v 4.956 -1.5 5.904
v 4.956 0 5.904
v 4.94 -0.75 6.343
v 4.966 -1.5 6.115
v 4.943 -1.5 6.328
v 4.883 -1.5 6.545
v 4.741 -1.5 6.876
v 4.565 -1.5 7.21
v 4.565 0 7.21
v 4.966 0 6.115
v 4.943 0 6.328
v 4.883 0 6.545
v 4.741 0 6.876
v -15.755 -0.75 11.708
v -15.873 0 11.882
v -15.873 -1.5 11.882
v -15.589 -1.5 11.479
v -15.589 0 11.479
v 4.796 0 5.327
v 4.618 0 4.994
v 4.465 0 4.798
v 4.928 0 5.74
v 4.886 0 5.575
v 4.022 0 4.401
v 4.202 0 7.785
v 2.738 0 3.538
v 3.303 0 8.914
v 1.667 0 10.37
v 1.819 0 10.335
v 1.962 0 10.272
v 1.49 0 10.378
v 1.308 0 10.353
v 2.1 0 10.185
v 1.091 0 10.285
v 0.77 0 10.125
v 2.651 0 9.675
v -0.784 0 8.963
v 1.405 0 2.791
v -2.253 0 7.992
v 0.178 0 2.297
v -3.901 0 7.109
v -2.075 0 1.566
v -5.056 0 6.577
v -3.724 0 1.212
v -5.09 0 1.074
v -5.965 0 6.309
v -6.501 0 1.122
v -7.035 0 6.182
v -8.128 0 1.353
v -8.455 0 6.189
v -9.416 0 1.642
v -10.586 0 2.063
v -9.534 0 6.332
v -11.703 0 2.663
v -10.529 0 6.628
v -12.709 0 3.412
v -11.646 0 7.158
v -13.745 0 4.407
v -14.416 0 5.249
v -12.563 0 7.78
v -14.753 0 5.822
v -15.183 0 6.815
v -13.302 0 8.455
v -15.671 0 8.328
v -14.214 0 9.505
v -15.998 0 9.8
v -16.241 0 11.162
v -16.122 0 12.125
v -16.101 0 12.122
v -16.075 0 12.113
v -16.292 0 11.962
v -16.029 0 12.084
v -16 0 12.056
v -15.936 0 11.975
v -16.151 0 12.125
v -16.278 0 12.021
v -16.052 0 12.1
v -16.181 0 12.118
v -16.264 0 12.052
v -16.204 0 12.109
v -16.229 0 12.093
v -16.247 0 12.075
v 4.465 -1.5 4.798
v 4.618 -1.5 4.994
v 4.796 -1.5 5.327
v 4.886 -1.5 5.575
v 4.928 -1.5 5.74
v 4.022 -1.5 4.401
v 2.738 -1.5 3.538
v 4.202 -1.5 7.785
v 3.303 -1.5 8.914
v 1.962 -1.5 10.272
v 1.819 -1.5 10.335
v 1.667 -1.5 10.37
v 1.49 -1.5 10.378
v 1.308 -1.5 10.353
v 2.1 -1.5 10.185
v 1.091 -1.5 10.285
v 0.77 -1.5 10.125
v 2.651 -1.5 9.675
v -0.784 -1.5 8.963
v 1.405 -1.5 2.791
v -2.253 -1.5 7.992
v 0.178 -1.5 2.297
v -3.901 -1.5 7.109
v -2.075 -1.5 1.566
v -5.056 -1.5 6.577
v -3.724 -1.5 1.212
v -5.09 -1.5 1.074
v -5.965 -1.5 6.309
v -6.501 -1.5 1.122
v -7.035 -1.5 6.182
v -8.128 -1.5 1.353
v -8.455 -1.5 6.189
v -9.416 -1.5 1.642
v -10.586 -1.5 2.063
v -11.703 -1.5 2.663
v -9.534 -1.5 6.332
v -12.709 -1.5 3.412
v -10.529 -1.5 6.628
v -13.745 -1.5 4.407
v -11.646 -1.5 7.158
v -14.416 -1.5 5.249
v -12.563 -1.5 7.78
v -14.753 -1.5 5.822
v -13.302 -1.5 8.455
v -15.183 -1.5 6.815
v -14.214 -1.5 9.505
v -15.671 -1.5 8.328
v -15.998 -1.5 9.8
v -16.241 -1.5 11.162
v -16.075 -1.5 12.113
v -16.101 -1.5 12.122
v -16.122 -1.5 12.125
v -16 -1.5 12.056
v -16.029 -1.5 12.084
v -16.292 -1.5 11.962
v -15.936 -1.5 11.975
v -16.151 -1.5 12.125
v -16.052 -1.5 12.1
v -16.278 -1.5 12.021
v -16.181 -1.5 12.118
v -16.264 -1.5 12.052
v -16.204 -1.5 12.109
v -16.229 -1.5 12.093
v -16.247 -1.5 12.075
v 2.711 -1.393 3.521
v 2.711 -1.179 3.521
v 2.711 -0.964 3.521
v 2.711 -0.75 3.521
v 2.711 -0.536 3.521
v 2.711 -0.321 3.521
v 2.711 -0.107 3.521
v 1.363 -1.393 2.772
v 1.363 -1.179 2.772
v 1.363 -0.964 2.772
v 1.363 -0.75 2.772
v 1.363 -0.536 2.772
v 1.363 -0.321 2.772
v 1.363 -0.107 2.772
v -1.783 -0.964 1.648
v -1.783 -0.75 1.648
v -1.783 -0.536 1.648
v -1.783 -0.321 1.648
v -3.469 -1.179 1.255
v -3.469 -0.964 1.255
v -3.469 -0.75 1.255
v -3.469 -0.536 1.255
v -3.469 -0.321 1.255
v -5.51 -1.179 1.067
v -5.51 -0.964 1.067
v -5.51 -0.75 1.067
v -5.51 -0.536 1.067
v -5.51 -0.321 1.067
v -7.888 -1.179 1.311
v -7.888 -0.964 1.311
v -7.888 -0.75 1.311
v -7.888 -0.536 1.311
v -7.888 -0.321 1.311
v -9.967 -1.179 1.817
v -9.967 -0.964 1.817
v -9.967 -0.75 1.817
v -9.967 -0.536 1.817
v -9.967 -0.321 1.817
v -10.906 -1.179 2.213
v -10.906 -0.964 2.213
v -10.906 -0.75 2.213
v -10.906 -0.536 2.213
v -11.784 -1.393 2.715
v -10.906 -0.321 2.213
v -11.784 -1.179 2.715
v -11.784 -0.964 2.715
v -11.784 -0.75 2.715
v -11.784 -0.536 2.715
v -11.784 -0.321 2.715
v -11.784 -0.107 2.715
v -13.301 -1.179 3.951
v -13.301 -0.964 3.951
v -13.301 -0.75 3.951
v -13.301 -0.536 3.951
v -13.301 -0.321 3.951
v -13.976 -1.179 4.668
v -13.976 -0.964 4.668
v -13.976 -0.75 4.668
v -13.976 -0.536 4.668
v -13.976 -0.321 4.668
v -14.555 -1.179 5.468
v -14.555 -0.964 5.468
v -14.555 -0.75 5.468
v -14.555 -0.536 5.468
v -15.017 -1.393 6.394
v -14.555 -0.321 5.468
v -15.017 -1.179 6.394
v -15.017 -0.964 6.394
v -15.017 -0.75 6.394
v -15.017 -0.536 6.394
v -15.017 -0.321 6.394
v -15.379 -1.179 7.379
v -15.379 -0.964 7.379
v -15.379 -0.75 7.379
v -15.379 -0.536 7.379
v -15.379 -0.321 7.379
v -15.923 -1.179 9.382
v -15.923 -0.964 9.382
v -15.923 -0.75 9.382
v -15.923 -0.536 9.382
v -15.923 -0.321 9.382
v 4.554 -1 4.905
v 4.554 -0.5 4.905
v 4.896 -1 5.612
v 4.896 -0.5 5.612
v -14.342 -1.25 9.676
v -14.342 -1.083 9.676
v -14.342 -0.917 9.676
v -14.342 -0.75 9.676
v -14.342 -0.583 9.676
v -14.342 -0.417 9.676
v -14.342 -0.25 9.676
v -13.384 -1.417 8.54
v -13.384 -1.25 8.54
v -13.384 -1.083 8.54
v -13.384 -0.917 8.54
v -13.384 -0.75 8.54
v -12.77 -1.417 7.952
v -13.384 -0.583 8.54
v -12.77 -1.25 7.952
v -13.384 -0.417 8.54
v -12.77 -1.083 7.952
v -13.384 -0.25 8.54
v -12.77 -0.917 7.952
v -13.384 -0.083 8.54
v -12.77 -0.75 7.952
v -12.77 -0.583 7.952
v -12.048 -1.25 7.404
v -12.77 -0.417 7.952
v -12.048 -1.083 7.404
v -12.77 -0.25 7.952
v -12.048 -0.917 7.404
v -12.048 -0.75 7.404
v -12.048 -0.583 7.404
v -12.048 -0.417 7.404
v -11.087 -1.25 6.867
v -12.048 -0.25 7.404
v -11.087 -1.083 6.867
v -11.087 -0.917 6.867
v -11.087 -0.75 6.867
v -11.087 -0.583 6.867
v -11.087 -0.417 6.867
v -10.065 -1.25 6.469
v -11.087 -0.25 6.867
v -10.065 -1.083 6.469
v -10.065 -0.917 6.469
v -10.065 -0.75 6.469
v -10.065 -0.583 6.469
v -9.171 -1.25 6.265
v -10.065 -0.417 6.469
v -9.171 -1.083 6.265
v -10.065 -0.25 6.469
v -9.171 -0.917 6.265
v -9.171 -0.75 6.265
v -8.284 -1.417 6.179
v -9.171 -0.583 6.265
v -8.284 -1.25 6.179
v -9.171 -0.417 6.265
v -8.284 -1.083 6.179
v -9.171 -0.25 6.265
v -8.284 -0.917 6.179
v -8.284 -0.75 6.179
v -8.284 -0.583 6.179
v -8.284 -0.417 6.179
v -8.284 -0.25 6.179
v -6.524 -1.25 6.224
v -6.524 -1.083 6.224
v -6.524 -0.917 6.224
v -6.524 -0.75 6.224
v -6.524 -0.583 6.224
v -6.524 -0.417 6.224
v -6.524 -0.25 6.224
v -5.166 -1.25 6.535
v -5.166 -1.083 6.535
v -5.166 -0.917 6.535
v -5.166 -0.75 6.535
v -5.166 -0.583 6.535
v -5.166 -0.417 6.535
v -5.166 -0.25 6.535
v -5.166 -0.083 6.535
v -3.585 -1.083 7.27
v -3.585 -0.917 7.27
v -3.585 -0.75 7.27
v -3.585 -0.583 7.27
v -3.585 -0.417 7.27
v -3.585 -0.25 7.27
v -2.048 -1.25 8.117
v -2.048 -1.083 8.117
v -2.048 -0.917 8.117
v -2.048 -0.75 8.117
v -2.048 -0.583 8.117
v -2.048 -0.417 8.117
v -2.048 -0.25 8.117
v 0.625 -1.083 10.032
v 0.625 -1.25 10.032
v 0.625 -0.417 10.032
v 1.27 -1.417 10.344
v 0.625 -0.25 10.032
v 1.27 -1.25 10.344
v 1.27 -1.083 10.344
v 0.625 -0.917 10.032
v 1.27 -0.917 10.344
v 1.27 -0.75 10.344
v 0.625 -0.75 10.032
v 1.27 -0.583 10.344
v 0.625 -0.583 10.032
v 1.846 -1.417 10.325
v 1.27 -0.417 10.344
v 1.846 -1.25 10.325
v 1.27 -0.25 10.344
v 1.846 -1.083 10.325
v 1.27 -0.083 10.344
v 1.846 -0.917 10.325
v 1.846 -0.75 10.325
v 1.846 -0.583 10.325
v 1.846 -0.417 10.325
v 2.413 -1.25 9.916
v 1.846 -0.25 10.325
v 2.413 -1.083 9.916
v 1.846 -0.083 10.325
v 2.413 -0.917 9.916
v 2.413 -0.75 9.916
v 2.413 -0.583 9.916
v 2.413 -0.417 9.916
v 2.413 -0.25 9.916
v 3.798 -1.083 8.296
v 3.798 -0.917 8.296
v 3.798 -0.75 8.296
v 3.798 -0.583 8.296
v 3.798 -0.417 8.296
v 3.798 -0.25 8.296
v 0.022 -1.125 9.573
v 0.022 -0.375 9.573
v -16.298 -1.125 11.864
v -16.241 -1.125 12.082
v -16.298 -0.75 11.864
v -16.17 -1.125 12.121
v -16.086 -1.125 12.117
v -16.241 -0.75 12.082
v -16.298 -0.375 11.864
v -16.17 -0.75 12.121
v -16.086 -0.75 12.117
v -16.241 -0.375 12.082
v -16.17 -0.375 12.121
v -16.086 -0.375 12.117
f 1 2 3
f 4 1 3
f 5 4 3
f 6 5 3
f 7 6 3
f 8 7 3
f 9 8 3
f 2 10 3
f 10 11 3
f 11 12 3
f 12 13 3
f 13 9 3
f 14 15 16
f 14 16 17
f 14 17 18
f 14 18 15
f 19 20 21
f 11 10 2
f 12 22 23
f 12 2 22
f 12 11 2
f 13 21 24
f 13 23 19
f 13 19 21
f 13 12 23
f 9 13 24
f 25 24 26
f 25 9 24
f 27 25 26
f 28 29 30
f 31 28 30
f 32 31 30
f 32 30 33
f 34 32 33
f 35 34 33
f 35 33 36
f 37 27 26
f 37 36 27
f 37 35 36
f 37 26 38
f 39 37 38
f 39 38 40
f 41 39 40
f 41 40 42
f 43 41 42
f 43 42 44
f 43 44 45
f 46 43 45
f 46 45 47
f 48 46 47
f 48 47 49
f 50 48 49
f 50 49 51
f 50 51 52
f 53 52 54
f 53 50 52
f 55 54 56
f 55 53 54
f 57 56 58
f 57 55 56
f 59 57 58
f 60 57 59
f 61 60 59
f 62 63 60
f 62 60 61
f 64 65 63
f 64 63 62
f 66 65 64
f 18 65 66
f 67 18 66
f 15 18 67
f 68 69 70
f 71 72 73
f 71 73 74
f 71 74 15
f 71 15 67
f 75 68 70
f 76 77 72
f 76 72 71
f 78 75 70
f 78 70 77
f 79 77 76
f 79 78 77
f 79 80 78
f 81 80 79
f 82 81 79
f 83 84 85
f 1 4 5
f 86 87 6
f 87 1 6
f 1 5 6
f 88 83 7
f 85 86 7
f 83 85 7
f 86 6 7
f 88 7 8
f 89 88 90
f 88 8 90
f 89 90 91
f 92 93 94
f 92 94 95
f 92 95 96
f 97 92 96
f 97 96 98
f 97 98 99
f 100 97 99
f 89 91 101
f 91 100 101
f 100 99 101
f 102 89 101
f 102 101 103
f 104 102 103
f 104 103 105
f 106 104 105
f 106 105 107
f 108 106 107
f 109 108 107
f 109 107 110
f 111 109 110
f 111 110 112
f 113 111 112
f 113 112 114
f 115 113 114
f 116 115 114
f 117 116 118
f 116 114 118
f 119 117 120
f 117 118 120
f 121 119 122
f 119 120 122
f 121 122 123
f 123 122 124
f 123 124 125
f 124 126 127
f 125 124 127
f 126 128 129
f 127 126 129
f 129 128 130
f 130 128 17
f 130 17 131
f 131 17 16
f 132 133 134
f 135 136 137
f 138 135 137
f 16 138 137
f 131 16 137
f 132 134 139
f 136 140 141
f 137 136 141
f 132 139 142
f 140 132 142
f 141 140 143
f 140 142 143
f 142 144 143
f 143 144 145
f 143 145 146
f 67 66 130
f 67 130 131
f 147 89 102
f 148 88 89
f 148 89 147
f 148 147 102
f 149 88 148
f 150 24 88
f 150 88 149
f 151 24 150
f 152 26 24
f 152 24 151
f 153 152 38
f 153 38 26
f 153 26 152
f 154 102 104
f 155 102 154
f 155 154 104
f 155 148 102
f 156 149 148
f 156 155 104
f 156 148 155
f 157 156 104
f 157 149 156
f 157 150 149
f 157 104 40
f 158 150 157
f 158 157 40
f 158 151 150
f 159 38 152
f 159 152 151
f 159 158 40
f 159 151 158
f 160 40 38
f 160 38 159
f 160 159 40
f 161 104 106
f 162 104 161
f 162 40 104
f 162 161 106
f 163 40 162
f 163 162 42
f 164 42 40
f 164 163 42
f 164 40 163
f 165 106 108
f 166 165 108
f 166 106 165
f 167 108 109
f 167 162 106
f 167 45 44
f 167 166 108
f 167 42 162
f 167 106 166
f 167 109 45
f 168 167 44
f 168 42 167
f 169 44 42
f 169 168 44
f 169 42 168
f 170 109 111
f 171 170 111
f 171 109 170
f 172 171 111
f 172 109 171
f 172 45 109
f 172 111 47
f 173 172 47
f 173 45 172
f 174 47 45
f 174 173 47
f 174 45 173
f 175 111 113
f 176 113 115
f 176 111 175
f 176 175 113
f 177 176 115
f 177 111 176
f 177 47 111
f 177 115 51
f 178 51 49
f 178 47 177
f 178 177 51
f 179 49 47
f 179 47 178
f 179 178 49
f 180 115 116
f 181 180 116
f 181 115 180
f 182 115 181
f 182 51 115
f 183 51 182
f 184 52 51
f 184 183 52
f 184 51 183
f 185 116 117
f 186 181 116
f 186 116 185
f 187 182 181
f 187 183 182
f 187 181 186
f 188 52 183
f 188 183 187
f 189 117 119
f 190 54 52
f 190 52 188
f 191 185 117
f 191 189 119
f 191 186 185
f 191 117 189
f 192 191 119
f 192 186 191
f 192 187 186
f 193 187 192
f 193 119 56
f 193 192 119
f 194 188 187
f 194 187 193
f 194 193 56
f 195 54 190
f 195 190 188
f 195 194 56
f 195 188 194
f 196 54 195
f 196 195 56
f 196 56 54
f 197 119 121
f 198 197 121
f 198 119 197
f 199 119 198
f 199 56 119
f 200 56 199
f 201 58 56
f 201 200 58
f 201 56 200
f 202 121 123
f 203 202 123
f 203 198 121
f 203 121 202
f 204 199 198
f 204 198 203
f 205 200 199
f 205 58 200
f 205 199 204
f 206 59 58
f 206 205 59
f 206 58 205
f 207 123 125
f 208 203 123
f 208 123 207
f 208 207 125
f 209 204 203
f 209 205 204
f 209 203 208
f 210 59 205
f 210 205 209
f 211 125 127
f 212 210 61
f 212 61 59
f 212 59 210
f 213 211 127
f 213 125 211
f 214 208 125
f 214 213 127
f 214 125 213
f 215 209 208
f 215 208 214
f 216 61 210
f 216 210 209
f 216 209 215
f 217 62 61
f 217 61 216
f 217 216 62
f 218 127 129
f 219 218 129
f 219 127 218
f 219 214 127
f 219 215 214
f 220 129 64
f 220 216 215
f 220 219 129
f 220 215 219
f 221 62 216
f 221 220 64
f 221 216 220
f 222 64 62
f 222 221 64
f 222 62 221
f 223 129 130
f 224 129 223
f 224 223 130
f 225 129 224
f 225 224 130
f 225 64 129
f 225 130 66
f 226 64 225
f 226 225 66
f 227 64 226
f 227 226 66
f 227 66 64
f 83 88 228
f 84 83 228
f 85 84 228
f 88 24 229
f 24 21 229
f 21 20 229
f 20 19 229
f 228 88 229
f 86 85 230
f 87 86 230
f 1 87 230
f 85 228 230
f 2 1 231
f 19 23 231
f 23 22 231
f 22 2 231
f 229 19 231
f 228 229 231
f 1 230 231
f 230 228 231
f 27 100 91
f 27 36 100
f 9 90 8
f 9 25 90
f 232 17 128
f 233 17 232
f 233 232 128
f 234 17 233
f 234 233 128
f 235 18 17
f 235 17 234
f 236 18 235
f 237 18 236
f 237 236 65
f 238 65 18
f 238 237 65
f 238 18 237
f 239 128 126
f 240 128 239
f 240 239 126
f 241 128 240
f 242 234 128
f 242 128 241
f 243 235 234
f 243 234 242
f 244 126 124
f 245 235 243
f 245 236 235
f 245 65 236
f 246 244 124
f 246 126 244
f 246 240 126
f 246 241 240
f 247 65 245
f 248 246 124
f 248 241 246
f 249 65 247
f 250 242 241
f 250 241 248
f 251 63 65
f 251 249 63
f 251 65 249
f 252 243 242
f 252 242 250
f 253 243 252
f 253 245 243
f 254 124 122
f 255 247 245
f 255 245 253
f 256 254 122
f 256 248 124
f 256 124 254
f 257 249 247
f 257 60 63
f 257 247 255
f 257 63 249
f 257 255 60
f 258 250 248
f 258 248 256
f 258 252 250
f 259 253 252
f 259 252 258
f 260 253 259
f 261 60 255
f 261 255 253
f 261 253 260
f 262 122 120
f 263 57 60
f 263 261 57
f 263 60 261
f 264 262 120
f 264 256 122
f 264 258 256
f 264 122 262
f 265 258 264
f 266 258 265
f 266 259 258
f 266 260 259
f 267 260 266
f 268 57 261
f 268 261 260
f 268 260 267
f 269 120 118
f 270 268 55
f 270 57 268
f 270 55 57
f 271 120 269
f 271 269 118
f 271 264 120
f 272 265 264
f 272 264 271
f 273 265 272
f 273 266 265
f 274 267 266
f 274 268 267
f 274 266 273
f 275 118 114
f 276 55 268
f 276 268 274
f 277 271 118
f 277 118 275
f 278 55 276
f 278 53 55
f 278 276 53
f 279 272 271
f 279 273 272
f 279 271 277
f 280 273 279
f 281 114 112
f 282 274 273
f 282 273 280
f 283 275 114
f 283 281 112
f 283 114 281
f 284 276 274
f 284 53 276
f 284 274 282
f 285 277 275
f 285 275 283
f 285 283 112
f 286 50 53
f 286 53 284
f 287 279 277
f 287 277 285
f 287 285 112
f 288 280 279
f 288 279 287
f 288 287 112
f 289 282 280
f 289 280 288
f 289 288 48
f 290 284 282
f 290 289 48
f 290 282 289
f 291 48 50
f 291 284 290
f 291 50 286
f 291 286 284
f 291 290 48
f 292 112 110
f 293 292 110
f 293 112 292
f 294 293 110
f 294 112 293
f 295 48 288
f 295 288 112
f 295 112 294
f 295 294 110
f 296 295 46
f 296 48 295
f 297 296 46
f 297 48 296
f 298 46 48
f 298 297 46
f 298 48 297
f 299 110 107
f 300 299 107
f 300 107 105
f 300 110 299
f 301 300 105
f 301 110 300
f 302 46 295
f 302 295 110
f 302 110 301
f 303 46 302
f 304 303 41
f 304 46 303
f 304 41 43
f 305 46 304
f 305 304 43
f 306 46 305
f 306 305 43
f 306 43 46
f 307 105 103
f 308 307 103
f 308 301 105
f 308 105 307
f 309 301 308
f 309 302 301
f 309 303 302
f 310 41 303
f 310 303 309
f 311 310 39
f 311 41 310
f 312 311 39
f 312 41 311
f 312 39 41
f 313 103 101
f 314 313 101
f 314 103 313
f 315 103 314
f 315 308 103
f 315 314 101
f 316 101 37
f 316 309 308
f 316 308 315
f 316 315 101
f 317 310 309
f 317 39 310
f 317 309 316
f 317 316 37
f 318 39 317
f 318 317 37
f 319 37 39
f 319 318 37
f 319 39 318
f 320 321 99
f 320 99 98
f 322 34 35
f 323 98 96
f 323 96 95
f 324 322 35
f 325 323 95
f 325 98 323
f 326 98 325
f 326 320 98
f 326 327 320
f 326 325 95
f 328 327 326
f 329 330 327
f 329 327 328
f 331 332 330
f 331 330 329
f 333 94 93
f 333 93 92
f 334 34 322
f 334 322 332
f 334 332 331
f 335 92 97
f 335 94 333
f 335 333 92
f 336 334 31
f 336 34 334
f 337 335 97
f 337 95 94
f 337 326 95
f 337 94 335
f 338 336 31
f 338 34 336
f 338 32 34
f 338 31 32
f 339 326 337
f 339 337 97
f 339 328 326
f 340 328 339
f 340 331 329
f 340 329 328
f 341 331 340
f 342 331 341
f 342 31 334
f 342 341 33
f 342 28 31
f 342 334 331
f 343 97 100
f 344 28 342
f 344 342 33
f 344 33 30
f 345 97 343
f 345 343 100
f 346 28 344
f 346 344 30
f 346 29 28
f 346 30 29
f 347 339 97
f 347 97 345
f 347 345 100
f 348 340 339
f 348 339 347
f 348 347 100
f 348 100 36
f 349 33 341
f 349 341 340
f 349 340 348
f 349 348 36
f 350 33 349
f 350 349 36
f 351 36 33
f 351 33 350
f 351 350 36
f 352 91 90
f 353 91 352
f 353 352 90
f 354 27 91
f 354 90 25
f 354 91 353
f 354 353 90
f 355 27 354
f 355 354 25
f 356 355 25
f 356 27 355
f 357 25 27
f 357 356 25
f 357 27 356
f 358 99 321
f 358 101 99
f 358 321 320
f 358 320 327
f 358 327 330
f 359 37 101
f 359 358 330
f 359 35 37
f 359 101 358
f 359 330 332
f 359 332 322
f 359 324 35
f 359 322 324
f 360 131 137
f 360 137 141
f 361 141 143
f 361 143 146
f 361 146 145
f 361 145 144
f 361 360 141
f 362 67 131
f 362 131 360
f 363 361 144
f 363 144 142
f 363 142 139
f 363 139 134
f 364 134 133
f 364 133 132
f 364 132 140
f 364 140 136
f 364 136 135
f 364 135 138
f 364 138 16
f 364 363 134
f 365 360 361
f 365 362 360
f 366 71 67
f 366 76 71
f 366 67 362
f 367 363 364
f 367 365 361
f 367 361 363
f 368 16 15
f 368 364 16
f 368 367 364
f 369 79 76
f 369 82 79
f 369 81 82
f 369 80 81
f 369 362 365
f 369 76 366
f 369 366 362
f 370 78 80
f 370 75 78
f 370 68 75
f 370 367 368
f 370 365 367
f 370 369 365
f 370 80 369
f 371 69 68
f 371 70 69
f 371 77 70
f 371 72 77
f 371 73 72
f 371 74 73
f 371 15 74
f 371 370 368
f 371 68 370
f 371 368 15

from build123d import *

# Parameters (mm, degrees)
F1_DEPTH = 1.5


with BuildPart() as f1:
    # F0 (on Front) → F1 (new body)
    with BuildSketch(Plane.XZ):
        with BuildLine():
            add(Edge.make_bspline(
                [(-15.5886812717, 11.4794949823), (-15.4143296847, 11.2382539811), (-15.0361844262, 10.7150345355), (-14.3520272629, 9.6369158456), (-13.3901809462, 8.4961422482), (-12.1013087962, 7.3193862365), (-10.0843733619, 6.363980171), (-8.321372324, 6.1358495153), (-6.5126508034, 6.1753650592), (-5.1529070228, 6.4692660827), (-3.5419333867, 7.2903643377), (-2.0612605045, 8.0556770571), (-0.2510856551, 9.3241557763), (0.5687606343, 10.0334130257), (1.2462094689, 10.3912597961), (1.8789769228, 10.3955484825), (2.442581301, 9.9073187544), (3.0325423811, 9.2674548808), (3.8016255024, 8.2778595229), (4.3631617457, 7.6096235524), (4.5653669513, 7.2100887828)],
                knots=[0, 0, 0, 0, 0.0212712459, 0.0461344856, 0.0730651165, 0.1023249612, 0.1350350284, 0.1647196312, 0.1940312263, 0.2201164738, 0.2492921901, 0.2785567502, 0.3112769334, 0.3344058624, 0.3531170279, 0.369878703, 0.3883554579, 0.4090860244, 0.4338064524, 0.4592890108, 0.4592890108, 0.4592890108, 0.4592890108], degree=3))
            add(Edge.make_bspline(
                [(-15.8734871656, 11.8816214435), (-15.8360353147, 11.825599868), (-15.7551088144, 11.7045476383), (-15.6468429454, 11.5581444589), (-15.5886812717, 11.4794949823)],
                knots=[0, 0, 0, 0, 0.4627884651, 1, 1, 1, 1], degree=3))
            add(Edge.make_bspline(
                [(-16.2409348995, 11.1616010599), (-16.2703143769, 11.4241276451), (-16.3163105059, 11.8351358634), (-16.2766238455, 12.0985623317), (-16.0542989155, 12.1625521871), (-15.9402444972, 11.985343612), (-15.8734871656, 11.8816214435)],
                knots=[0, 0, 0, 0, 0.3687463789, 0.5773045503, 0.7525916077, 1, 1, 1, 1], degree=3))
            add(Edge.make_bspline(
                [(4.0222675889, 4.4009554021), (3.6021214232, 4.0879163566), (2.711392987, 3.5070019245), (1.3858615233, 2.7255840104), (-0.2348494988, 2.1469154815), (-1.7808518748, 1.6221260795), (-3.4857384395, 1.214002475), (-5.5234793136, 0.976041948), (-7.8949454527, 1.2787065655), (-9.9769000961, 1.728705851), (-11.8276981969, 2.6487308245), (-13.3312194271, 3.9173596525), (-14.6651416452, 5.4067950099), (-15.4092058722, 7.3781913671), (-15.9673503273, 9.3212581102), (-16.1201270994, 10.6644633604), (-16.2409348995, 11.1616010599)],
                knots=[0.5275853115, 0.5275853115, 0.5275853115, 0.5275853115, 0.5553491604, 0.5827901242, 0.6116623363, 0.6399103515, 0.6689776706, 0.7006114359, 0.7347748549, 0.7670917923, 0.7985471692, 0.8294539301, 0.8604544038, 0.8923225225, 0.9241583255, 0.9538621091, 0.9538621091, 0.9538621091, 0.9538621091], degree=3))
            add(Edge.make_bspline(
                [(4.0222675889, 4.4009554021), (4.2126258121, 4.5540553088), (4.6001057654, 4.8656948253), (4.8703118565, 5.4594945664), (4.9442704879, 5.8067642972), (4.9558935946, 5.904401992)],
                knots=[0, 0, 0, 0, 0.2397665322, 0.488052069, 0.5846377064, 0.5846377064, 0.5846377064, 0.5846377064], degree=3))
            add(Edge.make_bspline(
                [(4.5653669513, 7.2100887828), (4.7618312787, 6.8218973434), (4.8919183573, 6.3322829413), (4.9512804987, 5.9393771693), (4.9558935946, 5.904401992)],
                knots=[0.4592890108, 0.4592890108, 0.4592890108, 0.4592890108, 0.4840480851, 0.4865206827, 0.4865206827, 0.4865206827, 0.4865206827], degree=3))
        make_face()
        with BuildLine():
            add(Edge.make_bspline(
                [(4.9558935946, 5.904401992), (4.9731158076, 6.0490739131), (4.9651784758, 6.4713839037), (4.7236661883, 6.9176099233), (4.5653669513, 7.2100887828)],
                knots=[0.5846377064, 0.5846377064, 0.5846377064, 0.5846377064, 0.7277507707, 1, 1, 1, 1], degree=3))
            add(Edge.make_bspline(
                [(4.5653669513, 7.2100887828), (4.7618312787, 6.8218973434), (4.8919183573, 6.3322829413), (4.9512804987, 5.9393771693), (4.9558935946, 5.904401992)],
                knots=[0.4592890108, 0.4592890108, 0.4592890108, 0.4592890108, 0.4840480851, 0.4865206827, 0.4865206827, 0.4865206827, 0.4865206827], degree=3))
        make_face()
    extrude(amount=F1_DEPTH)


solid = f1.part
